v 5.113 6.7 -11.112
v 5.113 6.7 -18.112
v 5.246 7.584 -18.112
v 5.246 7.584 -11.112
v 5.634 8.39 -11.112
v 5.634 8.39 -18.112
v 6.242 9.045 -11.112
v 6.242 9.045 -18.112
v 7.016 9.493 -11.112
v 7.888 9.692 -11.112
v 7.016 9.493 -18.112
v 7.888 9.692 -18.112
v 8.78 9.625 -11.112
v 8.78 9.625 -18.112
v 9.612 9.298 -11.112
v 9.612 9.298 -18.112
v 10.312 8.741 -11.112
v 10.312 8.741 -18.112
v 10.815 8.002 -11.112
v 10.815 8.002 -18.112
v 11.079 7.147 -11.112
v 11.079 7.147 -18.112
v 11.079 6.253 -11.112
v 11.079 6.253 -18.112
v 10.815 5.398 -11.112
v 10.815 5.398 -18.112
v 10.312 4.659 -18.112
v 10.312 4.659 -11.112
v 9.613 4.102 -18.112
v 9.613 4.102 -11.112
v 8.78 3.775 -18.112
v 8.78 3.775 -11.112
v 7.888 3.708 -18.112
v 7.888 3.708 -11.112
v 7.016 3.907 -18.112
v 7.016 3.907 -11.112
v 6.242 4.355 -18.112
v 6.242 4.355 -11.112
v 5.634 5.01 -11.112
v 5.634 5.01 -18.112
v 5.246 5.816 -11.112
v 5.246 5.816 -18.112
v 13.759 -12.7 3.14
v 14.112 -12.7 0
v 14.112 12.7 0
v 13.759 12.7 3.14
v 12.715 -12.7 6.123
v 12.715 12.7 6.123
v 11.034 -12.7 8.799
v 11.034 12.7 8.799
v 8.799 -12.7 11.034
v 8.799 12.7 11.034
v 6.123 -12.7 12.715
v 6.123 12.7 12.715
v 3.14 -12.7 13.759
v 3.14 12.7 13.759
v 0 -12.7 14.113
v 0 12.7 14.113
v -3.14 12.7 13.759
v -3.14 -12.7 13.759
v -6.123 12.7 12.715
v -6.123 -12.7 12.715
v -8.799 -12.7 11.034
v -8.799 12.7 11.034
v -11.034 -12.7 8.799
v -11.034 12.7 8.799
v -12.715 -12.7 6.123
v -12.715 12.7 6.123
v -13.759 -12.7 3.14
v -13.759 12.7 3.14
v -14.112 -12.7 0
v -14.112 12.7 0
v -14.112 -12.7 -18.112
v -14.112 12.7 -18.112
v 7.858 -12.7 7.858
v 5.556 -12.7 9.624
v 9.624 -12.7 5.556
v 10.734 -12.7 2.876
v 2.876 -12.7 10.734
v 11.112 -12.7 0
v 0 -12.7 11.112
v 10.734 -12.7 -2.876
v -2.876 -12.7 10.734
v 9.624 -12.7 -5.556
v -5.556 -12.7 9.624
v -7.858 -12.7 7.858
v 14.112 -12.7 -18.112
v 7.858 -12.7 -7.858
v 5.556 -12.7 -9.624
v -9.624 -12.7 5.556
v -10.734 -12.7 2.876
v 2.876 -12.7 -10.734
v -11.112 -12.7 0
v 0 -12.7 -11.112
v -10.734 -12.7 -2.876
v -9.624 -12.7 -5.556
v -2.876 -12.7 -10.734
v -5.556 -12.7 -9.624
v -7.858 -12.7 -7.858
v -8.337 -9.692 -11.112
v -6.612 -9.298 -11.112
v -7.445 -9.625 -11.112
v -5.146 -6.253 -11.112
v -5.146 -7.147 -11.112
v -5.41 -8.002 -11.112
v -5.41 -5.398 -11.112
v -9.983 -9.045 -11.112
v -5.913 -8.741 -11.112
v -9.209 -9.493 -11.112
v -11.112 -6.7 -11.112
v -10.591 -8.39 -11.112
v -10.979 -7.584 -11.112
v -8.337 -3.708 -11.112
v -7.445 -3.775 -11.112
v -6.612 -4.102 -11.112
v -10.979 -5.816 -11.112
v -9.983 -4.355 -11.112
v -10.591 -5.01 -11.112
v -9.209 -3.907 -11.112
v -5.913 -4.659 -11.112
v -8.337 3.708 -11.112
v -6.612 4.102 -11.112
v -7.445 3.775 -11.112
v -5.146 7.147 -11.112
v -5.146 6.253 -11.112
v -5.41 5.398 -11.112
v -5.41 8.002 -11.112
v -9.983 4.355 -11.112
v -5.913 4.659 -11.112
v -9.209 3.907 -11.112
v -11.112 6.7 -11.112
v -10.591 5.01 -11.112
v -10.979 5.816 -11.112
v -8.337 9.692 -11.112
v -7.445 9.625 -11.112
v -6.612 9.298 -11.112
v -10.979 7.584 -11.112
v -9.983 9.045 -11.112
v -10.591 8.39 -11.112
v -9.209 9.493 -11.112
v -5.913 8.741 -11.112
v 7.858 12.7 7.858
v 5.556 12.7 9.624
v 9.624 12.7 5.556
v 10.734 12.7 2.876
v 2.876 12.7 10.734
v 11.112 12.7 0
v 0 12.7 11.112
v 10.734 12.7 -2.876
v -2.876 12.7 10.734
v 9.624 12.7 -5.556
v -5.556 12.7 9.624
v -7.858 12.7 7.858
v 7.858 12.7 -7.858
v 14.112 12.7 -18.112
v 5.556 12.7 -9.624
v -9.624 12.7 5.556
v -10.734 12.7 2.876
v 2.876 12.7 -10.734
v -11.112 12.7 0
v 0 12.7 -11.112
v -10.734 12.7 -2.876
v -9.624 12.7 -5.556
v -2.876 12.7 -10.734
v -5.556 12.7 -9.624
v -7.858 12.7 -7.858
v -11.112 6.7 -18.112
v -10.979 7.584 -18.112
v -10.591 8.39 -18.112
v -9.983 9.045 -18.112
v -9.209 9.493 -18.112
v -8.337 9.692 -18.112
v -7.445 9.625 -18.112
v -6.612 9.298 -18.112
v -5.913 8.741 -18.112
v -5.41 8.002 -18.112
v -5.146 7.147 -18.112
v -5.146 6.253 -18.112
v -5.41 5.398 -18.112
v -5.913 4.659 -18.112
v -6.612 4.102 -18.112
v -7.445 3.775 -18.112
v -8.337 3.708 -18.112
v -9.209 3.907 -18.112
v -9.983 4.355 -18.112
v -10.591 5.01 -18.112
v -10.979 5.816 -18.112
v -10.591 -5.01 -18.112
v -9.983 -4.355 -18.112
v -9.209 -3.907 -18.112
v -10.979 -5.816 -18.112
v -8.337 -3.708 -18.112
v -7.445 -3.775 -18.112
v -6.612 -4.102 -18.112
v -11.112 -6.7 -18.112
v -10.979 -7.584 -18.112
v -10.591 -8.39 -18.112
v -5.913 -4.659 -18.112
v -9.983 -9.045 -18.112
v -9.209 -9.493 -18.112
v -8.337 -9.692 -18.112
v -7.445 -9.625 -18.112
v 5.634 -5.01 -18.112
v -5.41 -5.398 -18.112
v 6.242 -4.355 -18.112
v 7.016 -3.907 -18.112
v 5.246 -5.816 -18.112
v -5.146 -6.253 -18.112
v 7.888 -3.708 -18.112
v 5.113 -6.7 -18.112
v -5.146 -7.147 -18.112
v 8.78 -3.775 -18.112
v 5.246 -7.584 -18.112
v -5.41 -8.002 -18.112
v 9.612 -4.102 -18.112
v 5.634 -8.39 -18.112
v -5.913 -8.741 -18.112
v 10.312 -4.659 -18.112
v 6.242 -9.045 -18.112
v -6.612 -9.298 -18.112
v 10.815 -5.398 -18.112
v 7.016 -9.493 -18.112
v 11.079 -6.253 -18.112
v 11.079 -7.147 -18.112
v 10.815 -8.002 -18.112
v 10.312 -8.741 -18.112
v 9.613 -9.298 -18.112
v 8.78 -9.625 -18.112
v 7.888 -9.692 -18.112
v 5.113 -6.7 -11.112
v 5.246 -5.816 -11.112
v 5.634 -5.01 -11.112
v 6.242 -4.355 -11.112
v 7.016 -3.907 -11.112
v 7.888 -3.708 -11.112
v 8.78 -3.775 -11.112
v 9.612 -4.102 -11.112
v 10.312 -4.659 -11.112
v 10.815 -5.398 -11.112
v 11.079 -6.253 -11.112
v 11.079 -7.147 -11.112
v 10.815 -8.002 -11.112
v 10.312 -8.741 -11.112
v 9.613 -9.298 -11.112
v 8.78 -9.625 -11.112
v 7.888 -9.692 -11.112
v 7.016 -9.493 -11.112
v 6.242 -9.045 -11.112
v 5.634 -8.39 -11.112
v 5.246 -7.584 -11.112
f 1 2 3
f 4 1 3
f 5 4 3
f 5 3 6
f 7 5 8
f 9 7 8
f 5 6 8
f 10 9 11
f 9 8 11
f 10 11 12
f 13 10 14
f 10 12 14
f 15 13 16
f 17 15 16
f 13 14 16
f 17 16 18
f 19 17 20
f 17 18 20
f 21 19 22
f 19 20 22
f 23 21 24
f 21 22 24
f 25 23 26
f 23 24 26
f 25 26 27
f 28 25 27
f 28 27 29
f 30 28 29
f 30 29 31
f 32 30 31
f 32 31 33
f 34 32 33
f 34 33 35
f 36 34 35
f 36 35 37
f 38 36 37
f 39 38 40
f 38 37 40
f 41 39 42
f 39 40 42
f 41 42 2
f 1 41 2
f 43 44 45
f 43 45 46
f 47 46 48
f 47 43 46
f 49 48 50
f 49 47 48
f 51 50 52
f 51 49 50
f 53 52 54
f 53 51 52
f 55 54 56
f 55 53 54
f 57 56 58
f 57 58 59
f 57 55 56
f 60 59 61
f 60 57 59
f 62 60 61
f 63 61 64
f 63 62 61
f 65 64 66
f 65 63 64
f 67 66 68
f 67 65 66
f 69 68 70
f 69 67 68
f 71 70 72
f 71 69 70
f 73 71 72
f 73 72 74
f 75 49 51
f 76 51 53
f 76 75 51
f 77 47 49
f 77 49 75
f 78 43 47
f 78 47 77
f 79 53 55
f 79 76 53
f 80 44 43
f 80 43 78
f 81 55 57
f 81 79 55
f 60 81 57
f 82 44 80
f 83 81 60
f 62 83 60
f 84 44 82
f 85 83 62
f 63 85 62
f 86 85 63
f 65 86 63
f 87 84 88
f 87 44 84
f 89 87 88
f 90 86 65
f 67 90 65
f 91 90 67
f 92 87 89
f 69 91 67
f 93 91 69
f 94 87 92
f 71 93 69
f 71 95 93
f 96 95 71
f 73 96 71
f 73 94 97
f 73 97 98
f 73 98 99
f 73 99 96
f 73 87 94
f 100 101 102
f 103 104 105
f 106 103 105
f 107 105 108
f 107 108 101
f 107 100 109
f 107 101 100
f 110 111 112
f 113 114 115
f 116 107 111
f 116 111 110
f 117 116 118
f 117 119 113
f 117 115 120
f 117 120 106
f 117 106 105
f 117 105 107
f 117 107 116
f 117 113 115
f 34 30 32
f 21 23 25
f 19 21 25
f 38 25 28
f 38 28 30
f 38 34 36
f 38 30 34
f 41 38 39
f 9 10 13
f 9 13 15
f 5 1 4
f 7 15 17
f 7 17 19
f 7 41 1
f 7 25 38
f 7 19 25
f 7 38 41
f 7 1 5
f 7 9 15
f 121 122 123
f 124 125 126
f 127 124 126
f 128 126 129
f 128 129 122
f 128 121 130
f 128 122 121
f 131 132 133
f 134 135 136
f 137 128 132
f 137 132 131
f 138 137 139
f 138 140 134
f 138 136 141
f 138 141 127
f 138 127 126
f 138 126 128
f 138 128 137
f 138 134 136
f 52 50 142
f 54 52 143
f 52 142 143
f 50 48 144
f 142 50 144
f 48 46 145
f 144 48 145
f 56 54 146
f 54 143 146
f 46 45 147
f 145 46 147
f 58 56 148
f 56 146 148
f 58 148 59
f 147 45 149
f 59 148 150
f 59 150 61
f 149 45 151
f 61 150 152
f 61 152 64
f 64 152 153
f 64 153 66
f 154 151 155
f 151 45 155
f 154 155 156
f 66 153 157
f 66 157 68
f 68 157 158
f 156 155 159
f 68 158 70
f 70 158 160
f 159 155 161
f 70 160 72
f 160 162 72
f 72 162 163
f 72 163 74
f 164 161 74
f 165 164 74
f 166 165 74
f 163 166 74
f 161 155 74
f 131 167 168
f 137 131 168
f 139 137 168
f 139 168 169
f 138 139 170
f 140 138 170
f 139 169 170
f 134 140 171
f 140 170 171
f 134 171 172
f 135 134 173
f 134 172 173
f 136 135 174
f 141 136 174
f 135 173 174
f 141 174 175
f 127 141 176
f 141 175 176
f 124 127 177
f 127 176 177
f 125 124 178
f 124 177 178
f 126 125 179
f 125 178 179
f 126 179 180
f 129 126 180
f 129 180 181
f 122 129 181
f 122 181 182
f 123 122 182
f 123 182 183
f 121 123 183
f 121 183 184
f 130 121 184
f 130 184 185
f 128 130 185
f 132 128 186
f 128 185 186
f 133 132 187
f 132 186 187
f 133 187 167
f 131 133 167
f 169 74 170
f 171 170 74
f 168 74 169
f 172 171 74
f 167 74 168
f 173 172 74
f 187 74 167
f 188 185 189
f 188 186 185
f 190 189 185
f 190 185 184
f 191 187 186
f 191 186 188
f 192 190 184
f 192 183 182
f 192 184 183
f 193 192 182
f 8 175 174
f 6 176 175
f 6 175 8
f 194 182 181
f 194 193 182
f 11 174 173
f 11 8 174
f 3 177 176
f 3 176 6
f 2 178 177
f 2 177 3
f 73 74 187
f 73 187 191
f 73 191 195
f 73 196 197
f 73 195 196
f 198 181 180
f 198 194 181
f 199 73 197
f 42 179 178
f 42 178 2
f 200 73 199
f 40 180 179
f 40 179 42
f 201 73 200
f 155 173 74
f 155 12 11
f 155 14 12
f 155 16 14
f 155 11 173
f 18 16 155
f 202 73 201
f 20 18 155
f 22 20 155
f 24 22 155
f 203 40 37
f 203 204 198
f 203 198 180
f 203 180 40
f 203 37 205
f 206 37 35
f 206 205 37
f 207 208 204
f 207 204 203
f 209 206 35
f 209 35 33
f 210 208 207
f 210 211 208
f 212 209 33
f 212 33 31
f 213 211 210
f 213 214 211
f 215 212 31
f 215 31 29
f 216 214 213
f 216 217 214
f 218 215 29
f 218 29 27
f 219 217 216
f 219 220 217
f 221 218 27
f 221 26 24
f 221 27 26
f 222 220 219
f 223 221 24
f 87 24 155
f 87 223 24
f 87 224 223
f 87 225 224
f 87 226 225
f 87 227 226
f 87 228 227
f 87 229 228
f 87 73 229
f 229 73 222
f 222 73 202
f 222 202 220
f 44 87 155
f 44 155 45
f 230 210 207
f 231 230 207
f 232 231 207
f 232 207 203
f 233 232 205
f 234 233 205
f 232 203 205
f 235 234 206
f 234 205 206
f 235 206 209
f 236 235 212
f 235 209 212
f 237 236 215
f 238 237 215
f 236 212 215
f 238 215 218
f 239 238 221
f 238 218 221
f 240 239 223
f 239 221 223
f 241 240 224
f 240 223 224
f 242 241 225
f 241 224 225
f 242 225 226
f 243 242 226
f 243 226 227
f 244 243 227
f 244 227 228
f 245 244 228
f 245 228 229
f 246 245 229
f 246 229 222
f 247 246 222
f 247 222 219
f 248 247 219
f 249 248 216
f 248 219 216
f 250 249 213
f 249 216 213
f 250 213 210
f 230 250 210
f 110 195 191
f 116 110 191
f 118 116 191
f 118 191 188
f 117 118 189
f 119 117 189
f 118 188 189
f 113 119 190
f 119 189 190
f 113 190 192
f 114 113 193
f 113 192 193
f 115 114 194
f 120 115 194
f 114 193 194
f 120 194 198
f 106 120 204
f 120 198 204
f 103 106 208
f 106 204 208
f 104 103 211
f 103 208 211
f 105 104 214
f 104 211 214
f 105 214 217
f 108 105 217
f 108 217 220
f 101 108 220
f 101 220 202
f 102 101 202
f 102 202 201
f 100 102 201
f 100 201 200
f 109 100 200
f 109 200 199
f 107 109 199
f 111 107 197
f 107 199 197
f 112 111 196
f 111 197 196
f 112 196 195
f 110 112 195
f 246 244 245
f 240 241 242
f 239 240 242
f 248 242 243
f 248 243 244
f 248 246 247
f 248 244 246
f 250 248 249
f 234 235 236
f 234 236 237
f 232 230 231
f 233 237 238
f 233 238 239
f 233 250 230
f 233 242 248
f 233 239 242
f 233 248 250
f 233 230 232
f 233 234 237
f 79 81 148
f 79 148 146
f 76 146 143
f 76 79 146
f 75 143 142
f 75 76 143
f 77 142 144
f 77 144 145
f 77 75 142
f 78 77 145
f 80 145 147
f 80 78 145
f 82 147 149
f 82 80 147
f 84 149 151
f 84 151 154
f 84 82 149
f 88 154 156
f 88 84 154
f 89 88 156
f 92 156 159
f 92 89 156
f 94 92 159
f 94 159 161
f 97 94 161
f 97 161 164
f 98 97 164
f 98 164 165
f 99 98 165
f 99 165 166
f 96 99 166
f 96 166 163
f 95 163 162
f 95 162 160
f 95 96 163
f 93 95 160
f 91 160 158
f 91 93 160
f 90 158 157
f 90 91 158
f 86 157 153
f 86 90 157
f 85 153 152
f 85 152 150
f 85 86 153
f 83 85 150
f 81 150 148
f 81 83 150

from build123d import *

# Parameters (mm, degrees)
BOSS_EXTRUDE1_DEPTH      = 12.7
BOSS_EXTRUDE1_DEPTH_BACK = 12.7
SKETCH1_R                = 11.1125
SKETCH2_R                = 3
CUT_EXTRUDE1_DEPTH       = 7


with BuildPart() as part:
    # Sketch1 → Boss-Extrude1 (new, two sides: drawn at the far end of the back side and taken through both)
    with BuildSketch(Plane(origin=(0, 0, 0), x_dir=(1, 0, 0), z_dir=(0, 1, 0)).offset(-BOSS_EXTRUDE1_DEPTH_BACK)):
        with BuildLine():
            Line((-14.1125, 0), (-14.1125, 14.1125))
            Line((-14.1125, 14.1125), (-14.1125, 18.1125))
            Line((-14.1125, 18.1125), (14.1125, 18.1125))
            Line((14.1125, 18.1125), (14.1125, 14.1125))
            Line((14.1125, 14.1125), (14.1125, 0))
            ThreePointArc((14.1125, 0), (0, -14.1125), (-14.1125, 0))
        make_face()
        Circle(SKETCH1_R, mode=Mode.SUBTRACT)
    extrude(amount=BOSS_EXTRUDE1_DEPTH + BOSS_EXTRUDE1_DEPTH_BACK)

    # Sketch2 → Cut-Extrude1 (cut)
    with BuildSketch(Plane(origin=(0, 0, -18.1125), x_dir=(-1, 0, 0), z_dir=(0, 0, -1))):
        with Locations((8.1125, -6.7)):
            Circle(SKETCH2_R)
        with Locations((-8.1125, -6.7)):
            Circle(SKETCH2_R)
        with Locations((-8.1125, 6.7)):
            Circle(SKETCH2_R)
        with Locations((8.1125, 6.7)):
            Circle(SKETCH2_R)
    extrude(amount=-CUT_EXTRUDE1_DEPTH, mode=Mode.SUBTRACT)


solid = part.part
